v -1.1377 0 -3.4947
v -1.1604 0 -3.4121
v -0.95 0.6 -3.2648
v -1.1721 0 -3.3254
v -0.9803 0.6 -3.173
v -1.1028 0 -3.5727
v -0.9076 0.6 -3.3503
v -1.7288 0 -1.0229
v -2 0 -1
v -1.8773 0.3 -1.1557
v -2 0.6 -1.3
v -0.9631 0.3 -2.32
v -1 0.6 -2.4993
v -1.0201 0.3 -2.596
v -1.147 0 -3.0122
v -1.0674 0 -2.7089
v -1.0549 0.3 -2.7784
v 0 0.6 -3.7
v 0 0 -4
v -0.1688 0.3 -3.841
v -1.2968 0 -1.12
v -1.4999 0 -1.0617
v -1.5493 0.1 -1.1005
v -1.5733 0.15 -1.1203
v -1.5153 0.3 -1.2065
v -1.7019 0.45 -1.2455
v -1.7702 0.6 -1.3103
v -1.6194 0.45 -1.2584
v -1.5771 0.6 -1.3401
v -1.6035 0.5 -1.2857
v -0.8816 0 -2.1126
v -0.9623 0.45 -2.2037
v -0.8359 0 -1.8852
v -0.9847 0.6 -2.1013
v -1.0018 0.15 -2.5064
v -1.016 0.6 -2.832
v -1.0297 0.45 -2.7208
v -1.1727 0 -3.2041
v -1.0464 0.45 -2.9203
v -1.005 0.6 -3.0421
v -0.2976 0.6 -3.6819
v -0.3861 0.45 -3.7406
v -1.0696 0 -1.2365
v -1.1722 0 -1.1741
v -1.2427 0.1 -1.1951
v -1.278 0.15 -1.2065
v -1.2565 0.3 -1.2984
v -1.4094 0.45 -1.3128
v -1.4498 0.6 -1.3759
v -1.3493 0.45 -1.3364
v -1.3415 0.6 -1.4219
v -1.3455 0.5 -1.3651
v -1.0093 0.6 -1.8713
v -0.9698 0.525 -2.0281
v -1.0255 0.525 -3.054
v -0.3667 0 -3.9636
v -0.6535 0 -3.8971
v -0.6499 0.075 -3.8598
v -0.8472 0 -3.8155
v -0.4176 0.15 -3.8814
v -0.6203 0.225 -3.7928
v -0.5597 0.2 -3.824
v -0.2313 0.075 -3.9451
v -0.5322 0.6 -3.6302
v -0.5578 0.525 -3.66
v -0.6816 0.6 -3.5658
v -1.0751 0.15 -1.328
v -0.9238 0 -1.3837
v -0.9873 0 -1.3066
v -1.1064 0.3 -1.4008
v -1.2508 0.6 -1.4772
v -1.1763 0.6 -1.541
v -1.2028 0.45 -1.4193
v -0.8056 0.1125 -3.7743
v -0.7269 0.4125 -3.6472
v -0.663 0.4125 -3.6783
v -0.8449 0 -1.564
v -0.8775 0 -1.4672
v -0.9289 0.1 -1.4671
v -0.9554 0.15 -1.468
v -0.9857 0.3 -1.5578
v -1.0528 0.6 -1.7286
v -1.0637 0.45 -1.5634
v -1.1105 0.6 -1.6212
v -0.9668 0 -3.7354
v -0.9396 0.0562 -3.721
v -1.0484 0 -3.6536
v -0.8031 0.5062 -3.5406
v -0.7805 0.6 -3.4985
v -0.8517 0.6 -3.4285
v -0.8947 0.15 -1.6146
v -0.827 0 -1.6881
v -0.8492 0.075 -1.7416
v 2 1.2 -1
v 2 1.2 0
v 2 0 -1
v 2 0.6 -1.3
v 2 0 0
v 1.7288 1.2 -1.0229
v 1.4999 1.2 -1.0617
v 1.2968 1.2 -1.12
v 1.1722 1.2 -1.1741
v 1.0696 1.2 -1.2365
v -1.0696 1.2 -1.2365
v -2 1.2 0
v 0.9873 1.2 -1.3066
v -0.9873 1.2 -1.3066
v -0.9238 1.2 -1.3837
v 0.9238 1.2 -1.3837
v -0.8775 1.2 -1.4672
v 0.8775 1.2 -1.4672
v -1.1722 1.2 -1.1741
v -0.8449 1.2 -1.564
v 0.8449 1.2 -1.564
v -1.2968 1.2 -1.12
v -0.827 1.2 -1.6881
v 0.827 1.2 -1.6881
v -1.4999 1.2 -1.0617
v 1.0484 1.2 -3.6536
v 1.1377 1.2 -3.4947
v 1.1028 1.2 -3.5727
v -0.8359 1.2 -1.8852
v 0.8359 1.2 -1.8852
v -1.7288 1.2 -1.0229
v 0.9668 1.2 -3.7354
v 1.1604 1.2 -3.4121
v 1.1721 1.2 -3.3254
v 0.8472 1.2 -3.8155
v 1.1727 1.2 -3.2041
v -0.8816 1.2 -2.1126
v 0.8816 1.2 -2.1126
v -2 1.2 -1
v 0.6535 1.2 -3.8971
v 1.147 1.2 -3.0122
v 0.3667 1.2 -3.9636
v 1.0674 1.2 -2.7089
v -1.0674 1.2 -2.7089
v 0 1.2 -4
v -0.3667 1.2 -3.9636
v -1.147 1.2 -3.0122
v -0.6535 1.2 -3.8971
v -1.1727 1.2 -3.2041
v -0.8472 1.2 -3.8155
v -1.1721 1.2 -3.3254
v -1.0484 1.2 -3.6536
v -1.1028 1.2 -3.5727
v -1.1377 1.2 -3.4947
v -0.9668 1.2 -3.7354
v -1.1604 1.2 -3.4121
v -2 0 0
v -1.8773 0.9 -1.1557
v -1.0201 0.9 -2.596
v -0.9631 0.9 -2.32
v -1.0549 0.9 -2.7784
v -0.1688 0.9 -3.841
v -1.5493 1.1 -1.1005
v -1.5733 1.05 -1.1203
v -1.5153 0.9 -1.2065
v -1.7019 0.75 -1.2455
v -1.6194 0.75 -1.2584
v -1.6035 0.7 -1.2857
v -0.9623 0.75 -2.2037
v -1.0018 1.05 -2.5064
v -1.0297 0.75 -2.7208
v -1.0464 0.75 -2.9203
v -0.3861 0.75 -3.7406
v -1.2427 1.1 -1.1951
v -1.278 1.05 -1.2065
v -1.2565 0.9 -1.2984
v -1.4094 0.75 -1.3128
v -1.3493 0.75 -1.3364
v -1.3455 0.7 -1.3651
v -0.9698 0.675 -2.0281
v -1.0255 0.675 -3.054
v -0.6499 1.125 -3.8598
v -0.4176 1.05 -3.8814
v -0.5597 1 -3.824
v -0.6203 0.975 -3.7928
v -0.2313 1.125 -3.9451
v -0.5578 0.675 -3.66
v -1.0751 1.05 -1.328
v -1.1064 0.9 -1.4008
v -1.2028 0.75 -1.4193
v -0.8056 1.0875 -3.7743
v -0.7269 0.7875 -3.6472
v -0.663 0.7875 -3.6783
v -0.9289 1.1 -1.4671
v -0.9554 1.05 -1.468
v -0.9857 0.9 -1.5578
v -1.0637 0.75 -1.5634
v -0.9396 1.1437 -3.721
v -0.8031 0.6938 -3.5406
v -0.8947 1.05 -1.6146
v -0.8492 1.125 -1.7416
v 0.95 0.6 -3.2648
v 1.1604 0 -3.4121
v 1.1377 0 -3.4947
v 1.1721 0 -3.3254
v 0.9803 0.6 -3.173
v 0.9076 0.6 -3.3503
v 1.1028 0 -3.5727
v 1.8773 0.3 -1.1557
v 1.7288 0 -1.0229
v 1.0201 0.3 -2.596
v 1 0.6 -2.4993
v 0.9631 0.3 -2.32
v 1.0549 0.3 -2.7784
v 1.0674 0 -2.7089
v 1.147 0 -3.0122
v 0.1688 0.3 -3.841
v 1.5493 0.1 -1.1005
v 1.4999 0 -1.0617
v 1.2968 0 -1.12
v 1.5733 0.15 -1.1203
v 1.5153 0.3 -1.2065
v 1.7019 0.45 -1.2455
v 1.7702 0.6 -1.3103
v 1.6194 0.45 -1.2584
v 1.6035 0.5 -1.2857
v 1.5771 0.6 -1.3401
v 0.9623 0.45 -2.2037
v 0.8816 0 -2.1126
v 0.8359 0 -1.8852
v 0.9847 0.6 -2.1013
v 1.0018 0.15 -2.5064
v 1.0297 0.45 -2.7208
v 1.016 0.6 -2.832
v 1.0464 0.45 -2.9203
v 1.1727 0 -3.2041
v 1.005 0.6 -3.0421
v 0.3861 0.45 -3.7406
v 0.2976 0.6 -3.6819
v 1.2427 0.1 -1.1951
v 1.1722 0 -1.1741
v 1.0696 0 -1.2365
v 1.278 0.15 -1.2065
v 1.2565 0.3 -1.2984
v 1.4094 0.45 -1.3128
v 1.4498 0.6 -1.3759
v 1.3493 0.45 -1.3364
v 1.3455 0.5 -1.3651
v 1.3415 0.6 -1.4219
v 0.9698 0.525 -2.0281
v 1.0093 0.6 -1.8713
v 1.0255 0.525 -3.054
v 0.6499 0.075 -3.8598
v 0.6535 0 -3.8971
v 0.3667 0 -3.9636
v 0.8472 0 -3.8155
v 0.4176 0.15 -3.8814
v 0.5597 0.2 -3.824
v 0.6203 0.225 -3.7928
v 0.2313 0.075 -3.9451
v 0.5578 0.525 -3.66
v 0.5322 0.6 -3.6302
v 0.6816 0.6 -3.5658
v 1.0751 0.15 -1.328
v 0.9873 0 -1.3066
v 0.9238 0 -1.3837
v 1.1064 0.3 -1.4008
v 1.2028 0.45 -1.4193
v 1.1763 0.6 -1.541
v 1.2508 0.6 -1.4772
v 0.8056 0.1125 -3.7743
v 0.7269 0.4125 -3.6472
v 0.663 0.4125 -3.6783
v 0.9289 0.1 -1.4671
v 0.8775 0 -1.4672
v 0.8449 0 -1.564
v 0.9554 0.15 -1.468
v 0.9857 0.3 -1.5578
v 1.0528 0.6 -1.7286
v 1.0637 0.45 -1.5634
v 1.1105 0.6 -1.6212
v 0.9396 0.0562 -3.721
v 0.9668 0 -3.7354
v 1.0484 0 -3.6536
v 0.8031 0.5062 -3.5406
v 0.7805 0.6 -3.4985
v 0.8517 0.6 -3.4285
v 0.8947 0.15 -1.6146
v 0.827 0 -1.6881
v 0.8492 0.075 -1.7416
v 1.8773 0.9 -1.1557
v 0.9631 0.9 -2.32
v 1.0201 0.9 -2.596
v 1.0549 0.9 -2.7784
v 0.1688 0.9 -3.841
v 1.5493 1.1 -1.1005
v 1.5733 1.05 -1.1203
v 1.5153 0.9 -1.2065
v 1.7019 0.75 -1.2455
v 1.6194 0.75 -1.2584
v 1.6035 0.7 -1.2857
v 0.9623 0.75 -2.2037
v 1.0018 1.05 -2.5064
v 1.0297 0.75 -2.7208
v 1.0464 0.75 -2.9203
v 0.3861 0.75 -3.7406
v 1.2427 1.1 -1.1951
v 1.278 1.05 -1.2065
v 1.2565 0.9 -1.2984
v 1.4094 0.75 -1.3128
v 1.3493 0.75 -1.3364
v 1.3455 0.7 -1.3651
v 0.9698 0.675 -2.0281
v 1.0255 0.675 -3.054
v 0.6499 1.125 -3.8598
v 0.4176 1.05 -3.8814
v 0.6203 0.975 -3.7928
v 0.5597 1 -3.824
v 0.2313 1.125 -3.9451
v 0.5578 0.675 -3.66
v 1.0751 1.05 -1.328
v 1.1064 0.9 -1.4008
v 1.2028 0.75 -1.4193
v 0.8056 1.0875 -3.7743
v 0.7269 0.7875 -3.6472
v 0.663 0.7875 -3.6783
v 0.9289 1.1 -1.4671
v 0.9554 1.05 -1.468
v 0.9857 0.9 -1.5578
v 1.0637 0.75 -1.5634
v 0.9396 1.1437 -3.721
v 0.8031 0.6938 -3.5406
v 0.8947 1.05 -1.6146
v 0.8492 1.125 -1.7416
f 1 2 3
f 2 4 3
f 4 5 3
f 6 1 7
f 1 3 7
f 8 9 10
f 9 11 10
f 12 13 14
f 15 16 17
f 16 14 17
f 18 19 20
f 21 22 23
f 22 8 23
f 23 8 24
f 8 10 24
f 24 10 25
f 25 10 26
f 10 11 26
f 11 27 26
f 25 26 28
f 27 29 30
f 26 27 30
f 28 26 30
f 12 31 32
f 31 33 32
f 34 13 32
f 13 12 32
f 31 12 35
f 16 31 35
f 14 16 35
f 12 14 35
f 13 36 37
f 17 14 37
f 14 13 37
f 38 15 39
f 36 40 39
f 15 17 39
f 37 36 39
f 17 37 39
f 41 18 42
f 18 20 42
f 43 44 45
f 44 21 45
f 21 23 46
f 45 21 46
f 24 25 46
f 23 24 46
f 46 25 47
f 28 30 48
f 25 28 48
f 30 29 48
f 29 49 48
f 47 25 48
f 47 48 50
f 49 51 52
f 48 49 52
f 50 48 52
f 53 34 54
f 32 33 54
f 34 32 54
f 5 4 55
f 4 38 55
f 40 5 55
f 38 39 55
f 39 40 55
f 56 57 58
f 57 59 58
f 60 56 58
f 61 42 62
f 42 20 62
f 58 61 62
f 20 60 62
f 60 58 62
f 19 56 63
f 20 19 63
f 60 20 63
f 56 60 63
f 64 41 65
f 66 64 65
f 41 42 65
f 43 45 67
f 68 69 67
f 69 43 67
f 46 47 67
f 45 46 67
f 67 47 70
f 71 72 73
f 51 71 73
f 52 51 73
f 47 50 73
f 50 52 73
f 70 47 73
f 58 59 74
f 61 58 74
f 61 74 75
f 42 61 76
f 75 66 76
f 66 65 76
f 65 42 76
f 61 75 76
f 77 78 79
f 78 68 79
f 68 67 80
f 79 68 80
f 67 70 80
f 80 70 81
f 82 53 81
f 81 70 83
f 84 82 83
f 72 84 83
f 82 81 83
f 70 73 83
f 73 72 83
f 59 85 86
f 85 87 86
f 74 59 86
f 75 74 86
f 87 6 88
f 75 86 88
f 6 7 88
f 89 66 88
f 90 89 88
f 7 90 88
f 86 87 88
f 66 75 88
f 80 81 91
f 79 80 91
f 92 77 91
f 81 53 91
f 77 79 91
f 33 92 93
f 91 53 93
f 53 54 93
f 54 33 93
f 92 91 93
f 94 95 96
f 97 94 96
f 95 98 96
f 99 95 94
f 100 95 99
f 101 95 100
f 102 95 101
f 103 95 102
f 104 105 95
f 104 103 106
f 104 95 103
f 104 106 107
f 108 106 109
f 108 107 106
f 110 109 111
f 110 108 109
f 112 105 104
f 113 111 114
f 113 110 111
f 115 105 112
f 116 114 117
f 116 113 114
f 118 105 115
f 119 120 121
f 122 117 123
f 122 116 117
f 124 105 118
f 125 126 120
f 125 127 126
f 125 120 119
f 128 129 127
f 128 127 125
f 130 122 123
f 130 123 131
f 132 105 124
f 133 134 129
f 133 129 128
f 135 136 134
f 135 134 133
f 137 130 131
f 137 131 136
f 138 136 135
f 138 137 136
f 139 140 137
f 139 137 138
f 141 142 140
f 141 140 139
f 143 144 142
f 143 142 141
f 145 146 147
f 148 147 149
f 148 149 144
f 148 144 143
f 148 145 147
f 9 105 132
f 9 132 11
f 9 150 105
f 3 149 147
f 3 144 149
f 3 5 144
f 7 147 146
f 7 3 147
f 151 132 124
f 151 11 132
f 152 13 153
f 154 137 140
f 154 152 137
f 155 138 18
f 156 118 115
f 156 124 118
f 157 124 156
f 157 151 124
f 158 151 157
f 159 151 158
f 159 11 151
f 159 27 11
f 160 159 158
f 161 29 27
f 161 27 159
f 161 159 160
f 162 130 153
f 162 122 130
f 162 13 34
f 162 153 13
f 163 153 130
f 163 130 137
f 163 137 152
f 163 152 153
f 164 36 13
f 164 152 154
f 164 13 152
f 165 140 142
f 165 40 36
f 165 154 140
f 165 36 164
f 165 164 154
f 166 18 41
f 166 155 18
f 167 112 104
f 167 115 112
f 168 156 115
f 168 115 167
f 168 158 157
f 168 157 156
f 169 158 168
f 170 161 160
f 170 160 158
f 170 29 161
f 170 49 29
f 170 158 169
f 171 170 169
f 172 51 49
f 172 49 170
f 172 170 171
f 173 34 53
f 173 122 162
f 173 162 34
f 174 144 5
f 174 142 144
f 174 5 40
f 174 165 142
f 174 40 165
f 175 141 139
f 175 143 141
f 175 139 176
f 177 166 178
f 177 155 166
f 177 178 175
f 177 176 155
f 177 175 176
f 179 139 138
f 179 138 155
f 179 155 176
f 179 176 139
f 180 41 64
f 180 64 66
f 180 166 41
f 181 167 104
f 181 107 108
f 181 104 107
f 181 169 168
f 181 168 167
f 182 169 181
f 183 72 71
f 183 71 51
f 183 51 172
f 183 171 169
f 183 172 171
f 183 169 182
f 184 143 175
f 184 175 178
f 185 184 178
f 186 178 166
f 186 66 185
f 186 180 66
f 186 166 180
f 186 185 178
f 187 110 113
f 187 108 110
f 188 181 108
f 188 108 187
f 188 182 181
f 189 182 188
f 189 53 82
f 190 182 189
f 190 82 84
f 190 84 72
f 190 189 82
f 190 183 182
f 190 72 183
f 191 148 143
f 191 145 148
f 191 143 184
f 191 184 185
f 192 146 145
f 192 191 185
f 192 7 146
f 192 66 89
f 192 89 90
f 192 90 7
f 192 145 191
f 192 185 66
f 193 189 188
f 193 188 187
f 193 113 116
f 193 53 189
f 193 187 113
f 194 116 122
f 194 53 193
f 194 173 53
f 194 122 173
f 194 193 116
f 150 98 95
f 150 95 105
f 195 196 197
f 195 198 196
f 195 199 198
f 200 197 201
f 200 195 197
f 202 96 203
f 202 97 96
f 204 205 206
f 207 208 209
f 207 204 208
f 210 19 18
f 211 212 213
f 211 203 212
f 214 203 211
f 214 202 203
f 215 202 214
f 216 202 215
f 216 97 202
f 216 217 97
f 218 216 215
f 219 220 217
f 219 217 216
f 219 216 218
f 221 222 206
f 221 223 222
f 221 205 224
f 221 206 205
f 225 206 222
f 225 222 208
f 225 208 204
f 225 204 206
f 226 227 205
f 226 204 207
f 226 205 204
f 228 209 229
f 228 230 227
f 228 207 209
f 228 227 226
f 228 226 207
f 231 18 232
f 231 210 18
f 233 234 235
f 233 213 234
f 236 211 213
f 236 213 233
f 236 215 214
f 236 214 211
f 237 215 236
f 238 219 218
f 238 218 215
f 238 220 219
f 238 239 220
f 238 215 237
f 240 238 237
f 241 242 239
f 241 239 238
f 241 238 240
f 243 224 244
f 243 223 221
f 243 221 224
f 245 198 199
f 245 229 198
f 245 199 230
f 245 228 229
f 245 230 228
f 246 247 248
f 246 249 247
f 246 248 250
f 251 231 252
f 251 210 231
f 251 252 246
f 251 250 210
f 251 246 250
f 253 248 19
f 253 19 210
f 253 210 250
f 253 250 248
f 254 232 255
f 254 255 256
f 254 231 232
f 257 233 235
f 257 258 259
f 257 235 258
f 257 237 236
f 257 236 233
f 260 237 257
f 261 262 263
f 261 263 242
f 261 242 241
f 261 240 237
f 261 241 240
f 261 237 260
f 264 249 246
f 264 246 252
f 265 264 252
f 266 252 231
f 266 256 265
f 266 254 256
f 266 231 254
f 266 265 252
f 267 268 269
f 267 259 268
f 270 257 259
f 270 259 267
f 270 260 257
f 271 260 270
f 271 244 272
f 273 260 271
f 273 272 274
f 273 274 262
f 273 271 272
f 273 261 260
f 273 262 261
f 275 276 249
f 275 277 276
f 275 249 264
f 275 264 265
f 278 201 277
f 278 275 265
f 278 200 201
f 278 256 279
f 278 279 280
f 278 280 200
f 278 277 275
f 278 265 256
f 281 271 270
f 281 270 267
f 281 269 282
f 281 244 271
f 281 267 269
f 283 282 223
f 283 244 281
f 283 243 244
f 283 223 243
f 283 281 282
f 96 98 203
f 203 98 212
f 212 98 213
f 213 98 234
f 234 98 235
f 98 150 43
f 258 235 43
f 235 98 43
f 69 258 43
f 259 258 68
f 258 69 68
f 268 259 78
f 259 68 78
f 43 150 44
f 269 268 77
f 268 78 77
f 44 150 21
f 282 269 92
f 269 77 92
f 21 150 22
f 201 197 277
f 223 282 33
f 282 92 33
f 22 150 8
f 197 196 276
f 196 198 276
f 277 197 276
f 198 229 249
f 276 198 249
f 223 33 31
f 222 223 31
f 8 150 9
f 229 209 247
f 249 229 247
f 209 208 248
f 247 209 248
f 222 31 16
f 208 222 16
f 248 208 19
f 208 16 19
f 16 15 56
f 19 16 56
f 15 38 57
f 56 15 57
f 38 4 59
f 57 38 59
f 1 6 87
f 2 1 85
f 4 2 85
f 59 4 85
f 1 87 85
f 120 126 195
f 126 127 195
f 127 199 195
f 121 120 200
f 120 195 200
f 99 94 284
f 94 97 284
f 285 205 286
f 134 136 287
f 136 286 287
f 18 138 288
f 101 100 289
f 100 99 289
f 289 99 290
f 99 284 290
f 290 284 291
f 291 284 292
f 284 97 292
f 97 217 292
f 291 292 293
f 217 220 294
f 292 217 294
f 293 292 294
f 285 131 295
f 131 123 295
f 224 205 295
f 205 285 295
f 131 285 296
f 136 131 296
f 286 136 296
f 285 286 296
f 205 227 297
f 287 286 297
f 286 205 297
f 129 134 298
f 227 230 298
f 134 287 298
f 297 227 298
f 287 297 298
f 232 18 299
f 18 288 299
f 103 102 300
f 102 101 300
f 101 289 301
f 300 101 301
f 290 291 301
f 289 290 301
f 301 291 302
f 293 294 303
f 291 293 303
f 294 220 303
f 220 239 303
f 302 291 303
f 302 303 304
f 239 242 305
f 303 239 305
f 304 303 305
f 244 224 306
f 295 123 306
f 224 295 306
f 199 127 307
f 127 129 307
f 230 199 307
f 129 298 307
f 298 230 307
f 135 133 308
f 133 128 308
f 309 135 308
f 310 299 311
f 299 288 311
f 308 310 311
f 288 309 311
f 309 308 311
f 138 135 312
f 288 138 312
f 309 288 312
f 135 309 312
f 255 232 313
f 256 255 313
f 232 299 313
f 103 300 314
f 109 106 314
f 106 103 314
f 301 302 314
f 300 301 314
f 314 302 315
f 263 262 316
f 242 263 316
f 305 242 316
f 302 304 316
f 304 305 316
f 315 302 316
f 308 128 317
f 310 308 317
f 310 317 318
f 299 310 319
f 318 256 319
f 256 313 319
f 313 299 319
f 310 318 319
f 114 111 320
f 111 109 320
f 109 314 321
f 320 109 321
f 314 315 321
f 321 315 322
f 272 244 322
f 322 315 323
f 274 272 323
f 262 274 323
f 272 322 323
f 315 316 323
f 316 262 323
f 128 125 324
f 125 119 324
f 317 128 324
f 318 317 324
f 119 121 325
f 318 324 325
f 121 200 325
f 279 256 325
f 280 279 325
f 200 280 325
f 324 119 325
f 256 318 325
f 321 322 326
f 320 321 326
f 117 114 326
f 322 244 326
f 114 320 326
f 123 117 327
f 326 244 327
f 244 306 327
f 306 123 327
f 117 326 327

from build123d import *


# Read off the part's stored shape, not the designer's step: Mirror2
with BuildPart() as part:
    # Sketch1 → Loft1 section 0
    with BuildSketch(Plane(origin=(0, 0, 0), x_dir=(1, 0, 0), z_dir=(0, 1, 0))):
        with BuildLine():
            Line((0, 0), (2, 0))
            Line((2, 0), (2, 1))
            add(Edge.make_bspline(
                [(0, 4), (2.939621294, 3.853681673), (-0.939621294, 1.146318327), (2, 1)],
                knots=[0, 0, 0, 0, 1, 1, 1, 1], degree=3))
            Line((0, 4), (0, 0))
        make_face()
    # Sketch2 → Loft1 section 1
    with BuildSketch(Plane(origin=(0, 0.6, 0), x_dir=(1, 0, 0), z_dir=(0, 1, 0))):
        with BuildLine():
            Line((0, 0), (2, 0))
            Line((2, 0), (2, 1.3))
            add(Edge.make_bspline(
                [(0, 3.7), (2.166666667, 3.7), (-0.166666667, 1.3), (2, 1.3)],
                knots=[0, 0, 0, 0, 1, 1, 1, 1], degree=3))
            Line((0, 3.7), (0, 0))
        make_face()
    loft1 = loft()

    # Mirror1: Loft1 across plane
    add(loft1.mirror(Plane.ZX.offset(0.6)))

    # Mirror2: part across plane


with BuildPart() as part_1:
    add(part.part)
    add(part.part.mirror(Plane(origin=(0, 0, 0), x_dir=(0, 0, 1), z_dir=(1, 0, 0))))


solid = part_1.part
